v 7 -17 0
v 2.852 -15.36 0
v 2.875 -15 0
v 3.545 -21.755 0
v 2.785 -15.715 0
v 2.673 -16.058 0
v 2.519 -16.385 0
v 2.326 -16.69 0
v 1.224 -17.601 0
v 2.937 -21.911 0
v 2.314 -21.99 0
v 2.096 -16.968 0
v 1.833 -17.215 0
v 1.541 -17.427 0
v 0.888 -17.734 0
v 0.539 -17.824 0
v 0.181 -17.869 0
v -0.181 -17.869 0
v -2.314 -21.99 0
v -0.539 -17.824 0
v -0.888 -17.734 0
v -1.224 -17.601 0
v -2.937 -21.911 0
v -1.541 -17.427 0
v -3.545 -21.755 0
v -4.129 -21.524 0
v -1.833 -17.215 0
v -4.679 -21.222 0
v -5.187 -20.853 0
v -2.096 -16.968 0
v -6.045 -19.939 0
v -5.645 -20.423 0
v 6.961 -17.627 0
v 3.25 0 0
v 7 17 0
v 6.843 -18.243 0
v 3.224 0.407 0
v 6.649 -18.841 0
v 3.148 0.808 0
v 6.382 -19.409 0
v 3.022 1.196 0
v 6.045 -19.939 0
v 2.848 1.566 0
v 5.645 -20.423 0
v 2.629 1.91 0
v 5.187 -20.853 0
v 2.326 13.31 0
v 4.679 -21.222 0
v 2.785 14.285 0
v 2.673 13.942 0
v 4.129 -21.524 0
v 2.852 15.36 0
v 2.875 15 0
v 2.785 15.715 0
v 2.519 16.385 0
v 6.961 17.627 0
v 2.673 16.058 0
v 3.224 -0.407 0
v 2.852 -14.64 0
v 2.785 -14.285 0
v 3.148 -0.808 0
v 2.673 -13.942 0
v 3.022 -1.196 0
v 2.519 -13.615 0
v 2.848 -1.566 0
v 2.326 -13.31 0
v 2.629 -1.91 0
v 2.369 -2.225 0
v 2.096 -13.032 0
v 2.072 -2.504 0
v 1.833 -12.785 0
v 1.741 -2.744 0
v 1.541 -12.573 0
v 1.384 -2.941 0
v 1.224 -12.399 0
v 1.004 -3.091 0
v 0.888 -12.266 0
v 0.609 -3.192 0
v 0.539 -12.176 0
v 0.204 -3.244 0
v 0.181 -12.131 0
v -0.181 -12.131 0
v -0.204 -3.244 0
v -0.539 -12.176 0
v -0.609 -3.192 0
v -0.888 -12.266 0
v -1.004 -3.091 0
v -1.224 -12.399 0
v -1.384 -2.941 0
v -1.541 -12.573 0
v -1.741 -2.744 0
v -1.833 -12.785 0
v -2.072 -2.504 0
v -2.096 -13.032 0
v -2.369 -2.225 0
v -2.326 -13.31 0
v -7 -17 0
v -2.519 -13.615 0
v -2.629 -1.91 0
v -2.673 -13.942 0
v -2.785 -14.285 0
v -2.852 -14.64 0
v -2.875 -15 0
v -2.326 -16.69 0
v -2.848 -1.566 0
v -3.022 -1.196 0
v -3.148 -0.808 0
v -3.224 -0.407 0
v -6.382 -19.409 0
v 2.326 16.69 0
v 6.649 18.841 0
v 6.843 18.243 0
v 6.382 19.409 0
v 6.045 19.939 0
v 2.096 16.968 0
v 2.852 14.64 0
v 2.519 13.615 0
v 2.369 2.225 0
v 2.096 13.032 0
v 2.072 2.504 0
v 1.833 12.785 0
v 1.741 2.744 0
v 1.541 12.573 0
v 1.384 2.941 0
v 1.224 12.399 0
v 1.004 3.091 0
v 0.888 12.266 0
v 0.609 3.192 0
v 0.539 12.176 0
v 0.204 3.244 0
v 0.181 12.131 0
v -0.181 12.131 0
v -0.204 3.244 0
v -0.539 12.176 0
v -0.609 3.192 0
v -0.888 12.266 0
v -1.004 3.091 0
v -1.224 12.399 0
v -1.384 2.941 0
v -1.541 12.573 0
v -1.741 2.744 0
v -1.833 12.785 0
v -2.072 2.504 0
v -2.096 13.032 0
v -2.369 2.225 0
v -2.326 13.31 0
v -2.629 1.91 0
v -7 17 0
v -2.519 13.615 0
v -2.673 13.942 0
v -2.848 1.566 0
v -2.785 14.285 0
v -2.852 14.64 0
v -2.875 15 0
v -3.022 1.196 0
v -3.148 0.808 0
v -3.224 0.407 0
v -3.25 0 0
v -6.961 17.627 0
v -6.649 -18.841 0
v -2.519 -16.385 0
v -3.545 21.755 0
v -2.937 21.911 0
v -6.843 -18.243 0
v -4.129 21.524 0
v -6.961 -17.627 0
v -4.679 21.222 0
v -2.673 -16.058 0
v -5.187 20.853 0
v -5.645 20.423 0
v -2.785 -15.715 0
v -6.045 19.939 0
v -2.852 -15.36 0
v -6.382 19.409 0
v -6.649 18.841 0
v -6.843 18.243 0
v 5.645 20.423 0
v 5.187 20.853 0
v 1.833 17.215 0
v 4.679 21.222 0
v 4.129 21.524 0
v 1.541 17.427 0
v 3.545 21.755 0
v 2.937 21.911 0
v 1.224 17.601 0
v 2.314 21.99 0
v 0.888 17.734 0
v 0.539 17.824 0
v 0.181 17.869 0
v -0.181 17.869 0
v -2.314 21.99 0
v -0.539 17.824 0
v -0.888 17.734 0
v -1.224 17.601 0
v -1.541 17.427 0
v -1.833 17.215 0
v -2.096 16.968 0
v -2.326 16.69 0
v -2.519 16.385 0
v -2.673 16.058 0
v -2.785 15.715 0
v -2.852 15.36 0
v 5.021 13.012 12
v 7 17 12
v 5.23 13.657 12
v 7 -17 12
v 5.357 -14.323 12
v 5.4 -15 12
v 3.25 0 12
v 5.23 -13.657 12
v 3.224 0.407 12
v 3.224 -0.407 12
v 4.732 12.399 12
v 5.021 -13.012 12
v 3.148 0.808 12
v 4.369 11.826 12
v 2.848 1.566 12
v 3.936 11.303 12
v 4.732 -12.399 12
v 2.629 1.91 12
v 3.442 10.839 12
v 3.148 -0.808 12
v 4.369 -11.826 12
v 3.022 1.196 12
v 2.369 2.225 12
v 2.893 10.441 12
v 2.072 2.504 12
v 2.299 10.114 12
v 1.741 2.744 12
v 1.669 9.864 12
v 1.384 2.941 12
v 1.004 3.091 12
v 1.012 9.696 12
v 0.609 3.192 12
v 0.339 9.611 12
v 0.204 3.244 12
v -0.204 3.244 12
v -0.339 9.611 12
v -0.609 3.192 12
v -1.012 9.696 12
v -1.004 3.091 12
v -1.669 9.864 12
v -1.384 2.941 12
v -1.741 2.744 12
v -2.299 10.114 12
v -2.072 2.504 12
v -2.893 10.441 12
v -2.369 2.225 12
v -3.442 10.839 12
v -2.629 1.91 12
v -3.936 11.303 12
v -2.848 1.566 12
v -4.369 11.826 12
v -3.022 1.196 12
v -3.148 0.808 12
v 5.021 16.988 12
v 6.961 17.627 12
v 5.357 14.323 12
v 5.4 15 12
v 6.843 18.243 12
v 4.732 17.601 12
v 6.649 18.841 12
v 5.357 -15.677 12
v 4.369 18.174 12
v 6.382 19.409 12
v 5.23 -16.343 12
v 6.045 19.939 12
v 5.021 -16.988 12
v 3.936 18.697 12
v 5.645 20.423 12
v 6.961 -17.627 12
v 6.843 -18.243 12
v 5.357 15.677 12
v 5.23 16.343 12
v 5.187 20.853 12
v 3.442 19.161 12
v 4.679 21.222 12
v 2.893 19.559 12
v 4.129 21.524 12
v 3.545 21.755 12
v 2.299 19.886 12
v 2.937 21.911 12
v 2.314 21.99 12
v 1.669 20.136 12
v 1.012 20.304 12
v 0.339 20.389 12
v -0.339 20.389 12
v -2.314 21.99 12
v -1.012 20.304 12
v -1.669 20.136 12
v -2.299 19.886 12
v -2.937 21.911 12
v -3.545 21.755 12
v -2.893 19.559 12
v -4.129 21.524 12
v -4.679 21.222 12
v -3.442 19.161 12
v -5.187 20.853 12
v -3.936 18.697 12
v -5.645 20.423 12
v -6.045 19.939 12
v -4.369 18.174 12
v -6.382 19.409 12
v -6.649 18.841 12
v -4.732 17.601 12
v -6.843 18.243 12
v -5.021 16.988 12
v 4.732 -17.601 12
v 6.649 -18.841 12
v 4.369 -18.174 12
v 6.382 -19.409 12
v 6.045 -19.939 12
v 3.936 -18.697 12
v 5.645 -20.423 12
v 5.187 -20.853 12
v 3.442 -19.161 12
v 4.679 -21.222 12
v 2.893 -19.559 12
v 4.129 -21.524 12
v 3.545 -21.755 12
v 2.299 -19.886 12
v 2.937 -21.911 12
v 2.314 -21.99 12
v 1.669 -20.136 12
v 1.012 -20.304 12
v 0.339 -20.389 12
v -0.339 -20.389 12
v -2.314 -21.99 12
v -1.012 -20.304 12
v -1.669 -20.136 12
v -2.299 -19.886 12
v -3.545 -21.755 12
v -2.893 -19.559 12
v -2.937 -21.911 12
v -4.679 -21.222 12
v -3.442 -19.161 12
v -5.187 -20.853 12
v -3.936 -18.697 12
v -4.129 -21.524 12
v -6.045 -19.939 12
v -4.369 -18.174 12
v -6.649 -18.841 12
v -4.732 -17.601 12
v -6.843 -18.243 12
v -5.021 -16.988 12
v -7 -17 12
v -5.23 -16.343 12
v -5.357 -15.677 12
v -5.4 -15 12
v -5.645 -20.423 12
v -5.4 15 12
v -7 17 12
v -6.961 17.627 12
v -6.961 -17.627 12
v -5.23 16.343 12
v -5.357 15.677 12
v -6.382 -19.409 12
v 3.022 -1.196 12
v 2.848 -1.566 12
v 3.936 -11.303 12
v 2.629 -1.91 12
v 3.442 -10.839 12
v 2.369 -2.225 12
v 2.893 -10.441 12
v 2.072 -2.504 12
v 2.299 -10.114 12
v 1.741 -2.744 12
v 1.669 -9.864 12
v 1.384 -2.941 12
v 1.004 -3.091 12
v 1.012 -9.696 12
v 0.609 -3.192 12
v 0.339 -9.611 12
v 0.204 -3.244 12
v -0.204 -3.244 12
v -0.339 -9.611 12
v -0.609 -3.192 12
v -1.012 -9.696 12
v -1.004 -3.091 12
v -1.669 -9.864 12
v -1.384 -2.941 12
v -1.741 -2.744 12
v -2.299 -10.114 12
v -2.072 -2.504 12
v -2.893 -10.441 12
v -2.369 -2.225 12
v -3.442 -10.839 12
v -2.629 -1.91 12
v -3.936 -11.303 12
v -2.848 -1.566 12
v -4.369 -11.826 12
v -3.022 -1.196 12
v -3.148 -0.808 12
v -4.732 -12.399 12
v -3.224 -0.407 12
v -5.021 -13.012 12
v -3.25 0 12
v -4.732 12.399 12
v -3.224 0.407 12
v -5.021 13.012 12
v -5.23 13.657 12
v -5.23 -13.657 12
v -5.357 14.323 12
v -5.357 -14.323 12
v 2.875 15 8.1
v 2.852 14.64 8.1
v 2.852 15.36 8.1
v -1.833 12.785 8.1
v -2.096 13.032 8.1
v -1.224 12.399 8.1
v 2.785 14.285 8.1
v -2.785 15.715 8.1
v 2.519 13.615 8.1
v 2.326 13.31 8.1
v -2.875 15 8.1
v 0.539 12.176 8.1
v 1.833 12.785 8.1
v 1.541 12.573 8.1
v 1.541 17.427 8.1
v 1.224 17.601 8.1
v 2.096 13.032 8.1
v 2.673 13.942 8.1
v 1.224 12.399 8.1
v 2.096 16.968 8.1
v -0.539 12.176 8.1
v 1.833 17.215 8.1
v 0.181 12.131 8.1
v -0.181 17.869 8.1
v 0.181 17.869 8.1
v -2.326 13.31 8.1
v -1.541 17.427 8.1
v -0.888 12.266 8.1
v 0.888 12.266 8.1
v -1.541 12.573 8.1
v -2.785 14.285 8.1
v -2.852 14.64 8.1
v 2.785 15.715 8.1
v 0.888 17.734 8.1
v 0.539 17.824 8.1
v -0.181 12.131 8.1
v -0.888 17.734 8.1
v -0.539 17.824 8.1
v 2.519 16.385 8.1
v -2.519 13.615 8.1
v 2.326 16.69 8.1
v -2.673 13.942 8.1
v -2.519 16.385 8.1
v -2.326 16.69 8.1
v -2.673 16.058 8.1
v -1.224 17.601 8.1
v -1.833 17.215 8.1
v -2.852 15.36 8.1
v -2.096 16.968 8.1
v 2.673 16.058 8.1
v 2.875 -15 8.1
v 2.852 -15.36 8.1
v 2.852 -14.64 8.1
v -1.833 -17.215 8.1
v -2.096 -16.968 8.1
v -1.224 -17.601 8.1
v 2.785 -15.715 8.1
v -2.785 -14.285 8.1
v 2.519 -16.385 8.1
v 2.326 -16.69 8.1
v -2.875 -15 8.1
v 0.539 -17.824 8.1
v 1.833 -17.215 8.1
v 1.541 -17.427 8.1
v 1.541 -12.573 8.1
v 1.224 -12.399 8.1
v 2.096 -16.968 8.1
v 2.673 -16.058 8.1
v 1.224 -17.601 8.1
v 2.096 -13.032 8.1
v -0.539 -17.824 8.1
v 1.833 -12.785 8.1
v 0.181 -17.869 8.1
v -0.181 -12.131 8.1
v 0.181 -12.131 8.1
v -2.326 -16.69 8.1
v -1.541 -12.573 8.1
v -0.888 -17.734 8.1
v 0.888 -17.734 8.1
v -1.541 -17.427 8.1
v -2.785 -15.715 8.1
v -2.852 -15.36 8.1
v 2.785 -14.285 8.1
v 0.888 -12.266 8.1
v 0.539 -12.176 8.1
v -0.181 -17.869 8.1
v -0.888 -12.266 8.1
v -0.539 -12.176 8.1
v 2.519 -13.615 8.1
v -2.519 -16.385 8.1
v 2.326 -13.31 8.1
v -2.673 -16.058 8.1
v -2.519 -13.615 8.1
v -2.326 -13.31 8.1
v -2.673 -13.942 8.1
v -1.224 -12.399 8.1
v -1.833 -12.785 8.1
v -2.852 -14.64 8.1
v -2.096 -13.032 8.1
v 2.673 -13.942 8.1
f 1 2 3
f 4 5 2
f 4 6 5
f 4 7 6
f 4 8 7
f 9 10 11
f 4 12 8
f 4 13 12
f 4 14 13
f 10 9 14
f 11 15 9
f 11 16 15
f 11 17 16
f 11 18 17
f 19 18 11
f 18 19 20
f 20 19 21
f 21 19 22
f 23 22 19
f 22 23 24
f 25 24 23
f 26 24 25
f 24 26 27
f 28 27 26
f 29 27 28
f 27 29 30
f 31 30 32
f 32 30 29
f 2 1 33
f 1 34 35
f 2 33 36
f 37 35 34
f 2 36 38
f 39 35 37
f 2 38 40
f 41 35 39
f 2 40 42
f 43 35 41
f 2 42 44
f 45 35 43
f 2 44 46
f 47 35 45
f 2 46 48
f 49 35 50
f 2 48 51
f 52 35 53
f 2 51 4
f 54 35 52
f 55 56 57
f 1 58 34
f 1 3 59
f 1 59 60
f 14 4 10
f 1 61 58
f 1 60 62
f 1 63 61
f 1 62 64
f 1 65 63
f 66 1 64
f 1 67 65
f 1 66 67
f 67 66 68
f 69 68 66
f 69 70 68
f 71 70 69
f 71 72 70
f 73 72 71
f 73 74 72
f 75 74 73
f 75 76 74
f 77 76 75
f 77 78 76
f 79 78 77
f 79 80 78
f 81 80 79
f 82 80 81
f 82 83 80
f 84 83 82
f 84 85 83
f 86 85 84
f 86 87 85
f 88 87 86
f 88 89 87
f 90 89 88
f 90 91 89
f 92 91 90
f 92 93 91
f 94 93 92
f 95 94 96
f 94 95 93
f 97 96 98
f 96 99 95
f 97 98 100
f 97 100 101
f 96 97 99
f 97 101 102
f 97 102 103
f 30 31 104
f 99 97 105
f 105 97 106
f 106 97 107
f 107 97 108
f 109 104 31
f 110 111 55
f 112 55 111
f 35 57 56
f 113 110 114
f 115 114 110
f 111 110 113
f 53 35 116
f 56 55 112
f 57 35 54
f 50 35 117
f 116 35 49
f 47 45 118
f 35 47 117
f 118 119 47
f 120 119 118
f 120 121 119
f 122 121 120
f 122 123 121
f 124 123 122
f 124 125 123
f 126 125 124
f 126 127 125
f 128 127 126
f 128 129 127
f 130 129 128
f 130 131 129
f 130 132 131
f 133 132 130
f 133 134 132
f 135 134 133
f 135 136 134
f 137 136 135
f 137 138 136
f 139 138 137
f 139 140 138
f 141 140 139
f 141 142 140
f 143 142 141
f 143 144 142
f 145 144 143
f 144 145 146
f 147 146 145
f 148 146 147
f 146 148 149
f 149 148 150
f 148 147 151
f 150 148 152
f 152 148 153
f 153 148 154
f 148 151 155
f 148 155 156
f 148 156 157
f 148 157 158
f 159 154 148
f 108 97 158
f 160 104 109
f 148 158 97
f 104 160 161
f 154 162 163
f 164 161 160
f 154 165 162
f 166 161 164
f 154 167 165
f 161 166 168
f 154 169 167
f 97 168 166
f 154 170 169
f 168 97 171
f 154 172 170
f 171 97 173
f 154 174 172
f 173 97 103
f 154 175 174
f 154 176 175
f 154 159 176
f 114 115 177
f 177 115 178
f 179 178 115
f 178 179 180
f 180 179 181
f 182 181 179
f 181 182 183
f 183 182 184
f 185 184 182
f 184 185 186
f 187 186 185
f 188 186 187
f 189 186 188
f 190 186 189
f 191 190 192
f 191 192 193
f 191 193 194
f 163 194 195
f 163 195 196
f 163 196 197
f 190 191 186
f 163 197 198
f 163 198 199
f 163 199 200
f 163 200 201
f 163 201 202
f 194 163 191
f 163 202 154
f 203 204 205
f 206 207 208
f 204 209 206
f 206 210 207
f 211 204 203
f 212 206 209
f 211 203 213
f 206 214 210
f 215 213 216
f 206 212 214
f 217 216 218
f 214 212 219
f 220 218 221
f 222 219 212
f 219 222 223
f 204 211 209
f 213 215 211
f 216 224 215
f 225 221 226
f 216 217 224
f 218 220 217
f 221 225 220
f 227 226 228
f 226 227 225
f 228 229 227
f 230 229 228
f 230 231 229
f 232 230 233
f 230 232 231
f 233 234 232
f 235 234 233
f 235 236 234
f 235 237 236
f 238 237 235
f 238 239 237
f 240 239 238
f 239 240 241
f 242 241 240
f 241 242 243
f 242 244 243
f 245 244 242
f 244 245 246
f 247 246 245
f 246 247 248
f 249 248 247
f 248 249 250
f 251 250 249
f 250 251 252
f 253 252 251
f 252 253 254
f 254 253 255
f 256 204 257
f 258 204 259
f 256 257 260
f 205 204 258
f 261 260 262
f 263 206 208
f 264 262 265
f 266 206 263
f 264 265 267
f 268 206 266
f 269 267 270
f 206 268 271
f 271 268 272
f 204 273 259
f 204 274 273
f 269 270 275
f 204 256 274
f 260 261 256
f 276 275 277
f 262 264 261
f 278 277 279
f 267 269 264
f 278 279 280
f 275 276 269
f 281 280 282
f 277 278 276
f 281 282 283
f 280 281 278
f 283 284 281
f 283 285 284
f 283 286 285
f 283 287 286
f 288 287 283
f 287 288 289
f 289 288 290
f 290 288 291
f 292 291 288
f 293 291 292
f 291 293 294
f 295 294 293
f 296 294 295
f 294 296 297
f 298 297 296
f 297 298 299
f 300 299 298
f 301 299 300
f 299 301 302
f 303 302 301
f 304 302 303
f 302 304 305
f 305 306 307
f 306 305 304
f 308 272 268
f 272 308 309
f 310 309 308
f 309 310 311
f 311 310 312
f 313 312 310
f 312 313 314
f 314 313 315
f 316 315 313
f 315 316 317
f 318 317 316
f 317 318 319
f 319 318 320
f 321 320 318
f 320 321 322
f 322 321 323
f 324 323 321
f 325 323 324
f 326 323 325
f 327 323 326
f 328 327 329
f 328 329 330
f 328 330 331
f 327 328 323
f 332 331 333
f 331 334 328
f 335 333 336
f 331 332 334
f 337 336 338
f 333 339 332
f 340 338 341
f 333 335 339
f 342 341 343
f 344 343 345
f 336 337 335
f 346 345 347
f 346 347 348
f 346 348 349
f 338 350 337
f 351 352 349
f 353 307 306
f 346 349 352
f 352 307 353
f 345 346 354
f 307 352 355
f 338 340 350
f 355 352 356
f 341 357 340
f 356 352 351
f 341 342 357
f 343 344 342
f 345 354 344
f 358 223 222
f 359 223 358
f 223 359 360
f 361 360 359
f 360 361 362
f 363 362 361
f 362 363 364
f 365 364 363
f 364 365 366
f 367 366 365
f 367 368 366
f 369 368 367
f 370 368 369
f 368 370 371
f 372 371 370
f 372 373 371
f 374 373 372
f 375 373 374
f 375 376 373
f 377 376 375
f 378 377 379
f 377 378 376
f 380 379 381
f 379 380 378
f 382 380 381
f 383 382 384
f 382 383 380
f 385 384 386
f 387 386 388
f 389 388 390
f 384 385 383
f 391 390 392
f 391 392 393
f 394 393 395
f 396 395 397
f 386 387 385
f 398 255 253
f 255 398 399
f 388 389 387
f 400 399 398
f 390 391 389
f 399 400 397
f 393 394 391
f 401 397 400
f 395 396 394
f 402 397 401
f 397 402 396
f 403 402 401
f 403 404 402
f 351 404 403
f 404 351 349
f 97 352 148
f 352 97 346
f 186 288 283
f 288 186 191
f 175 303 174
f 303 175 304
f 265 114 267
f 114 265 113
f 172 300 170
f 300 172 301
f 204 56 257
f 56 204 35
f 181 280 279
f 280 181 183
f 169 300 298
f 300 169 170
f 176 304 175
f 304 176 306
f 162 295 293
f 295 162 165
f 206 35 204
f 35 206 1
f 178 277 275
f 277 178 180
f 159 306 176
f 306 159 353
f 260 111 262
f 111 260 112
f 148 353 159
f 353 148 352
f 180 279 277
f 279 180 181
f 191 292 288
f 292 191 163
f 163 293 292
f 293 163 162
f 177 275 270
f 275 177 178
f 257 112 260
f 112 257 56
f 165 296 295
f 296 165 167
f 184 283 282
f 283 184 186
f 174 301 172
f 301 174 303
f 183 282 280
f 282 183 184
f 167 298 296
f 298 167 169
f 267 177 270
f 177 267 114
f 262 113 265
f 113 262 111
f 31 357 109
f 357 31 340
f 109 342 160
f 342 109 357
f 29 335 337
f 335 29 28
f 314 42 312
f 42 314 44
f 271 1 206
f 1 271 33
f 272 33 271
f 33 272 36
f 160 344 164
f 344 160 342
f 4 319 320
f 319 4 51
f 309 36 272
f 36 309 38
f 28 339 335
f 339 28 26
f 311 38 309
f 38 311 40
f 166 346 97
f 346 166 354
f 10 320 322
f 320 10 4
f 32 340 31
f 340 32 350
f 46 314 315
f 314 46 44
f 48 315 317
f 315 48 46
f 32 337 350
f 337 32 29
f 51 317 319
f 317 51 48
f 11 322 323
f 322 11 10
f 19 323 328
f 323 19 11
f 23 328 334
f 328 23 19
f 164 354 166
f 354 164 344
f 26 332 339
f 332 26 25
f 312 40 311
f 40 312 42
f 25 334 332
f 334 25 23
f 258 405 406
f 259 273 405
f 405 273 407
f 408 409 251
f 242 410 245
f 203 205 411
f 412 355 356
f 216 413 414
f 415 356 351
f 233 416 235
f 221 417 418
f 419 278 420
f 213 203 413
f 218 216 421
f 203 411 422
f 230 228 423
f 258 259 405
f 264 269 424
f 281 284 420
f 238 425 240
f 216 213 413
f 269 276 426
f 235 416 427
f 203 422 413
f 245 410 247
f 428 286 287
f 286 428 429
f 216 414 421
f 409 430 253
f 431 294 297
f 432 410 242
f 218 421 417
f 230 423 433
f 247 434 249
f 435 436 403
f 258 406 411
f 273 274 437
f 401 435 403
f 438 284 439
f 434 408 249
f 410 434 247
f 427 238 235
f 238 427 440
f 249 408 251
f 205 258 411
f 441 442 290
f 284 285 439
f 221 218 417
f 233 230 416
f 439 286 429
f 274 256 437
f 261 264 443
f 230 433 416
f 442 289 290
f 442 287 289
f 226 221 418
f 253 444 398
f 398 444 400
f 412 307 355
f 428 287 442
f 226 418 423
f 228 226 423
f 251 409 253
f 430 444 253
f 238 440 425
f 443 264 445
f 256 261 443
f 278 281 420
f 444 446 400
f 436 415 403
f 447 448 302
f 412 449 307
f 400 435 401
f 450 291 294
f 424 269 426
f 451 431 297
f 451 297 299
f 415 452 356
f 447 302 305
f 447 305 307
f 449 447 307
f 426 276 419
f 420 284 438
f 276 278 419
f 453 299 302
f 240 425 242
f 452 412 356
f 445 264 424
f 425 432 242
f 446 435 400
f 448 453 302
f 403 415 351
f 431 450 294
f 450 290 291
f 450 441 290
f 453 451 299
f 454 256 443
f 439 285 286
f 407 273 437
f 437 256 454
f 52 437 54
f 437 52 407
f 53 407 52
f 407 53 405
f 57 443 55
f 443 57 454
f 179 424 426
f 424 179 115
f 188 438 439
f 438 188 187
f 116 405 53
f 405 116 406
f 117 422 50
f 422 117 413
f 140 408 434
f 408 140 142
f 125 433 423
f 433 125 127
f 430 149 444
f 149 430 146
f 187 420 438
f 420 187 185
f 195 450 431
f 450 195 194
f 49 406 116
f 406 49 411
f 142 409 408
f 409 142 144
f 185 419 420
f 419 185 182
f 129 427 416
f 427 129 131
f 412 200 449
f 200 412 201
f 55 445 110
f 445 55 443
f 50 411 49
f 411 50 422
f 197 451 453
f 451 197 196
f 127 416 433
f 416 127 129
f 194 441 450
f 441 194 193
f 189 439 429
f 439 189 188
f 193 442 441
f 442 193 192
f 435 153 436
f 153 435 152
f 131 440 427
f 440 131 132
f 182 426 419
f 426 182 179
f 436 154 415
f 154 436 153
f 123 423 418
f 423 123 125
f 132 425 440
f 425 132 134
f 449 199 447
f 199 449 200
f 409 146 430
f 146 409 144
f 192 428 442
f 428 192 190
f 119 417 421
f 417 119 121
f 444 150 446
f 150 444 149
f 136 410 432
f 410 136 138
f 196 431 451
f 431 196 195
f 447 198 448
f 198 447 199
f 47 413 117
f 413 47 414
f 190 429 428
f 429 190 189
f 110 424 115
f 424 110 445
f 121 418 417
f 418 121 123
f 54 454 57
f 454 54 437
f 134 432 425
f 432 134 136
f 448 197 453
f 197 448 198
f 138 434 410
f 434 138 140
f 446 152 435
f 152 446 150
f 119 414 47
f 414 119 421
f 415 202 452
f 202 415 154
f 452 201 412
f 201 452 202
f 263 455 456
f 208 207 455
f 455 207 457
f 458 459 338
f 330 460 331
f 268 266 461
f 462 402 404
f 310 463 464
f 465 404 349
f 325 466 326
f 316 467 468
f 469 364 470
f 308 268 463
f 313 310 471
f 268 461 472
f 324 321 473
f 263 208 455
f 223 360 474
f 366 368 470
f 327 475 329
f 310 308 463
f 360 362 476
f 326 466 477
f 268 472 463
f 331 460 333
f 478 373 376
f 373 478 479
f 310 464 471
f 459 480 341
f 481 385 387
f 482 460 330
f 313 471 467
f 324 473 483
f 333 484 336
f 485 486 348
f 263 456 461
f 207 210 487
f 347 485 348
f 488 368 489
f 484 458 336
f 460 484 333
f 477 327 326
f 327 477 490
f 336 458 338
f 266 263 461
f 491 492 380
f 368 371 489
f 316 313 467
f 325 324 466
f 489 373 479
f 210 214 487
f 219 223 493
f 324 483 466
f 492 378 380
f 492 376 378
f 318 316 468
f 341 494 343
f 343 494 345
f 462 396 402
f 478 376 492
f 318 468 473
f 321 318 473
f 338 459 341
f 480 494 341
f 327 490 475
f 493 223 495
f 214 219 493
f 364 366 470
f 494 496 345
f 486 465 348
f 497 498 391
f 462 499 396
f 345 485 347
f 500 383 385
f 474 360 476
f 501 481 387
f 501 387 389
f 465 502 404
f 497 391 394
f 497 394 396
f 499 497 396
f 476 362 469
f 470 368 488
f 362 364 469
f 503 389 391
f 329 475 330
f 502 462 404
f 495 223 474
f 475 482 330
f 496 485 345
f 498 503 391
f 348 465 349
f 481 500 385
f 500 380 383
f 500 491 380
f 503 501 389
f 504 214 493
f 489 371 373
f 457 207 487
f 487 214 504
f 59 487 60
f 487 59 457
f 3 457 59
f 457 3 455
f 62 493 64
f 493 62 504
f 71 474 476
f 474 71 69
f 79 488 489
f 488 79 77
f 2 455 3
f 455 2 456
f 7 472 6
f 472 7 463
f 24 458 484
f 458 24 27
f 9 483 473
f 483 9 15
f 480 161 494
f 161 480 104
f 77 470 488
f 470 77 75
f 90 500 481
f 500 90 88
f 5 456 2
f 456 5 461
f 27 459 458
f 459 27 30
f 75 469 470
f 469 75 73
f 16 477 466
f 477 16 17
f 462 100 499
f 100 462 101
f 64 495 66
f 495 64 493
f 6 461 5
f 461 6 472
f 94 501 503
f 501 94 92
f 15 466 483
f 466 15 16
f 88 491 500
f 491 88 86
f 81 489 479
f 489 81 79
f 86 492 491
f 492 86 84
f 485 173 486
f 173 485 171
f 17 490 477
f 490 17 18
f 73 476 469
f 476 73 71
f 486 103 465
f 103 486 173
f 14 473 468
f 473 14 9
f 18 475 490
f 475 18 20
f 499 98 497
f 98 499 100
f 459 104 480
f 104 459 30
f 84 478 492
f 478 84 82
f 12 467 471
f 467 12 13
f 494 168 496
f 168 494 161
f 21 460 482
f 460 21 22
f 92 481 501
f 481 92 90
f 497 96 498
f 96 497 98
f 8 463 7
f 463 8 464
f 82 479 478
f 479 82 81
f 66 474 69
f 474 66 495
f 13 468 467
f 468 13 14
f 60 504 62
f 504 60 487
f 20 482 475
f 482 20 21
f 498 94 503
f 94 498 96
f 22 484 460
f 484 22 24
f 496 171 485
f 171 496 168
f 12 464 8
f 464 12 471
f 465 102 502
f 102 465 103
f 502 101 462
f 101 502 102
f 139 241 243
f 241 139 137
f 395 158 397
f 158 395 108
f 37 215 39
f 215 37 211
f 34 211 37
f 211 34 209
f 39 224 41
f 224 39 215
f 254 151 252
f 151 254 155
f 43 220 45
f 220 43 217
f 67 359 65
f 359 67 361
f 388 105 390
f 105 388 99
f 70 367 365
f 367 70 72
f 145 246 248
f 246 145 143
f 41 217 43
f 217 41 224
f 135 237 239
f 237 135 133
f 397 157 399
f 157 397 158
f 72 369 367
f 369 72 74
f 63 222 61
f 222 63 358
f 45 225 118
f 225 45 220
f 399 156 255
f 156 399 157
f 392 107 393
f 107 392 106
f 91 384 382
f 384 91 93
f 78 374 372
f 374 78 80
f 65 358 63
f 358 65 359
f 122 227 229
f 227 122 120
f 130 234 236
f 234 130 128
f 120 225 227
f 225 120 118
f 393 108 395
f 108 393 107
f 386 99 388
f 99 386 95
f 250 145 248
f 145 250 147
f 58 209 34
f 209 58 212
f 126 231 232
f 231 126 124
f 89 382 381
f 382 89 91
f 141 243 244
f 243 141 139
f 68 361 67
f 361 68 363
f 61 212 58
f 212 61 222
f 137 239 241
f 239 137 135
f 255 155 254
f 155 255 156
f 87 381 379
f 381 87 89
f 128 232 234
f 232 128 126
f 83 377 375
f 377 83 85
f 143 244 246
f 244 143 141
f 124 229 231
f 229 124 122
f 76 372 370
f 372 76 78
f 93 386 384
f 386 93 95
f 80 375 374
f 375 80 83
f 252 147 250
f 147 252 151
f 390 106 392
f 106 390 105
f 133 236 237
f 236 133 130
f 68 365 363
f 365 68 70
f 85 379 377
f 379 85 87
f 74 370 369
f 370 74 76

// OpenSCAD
$fn = 50;


difference() {
	union() {
		cylinder(h = 12, r = 7.0000000000);
		translate(v = [0.0000000000, 7.5000000000, 0]) {
			hull() {
				translate(v = [-2.0000000000, 9.5000000000, 0]) {
					cylinder(h = 12, r = 5);
				}
				translate(v = [2.0000000000, 9.5000000000, 0]) {
					cylinder(h = 12, r = 5);
				}
				translate(v = [-2.0000000000, -9.5000000000, 0]) {
					cylinder(h = 12, r = 5);
				}
				translate(v = [2.0000000000, -9.5000000000, 0]) {
					cylinder(h = 12, r = 5);
				}
			}
		}
		translate(v = [0.0000000000, 7.5000000000, 0]) {
			hull() {
				translate(v = [-2.0000000000, 9.5000000000, 0]) {
					cylinder(h = 12, r = 5);
				}
				translate(v = [2.0000000000, 9.5000000000, 0]) {
					cylinder(h = 12, r = 5);
				}
				translate(v = [-2.0000000000, -9.5000000000, 0]) {
					cylinder(h = 12, r = 5);
				}
				translate(v = [2.0000000000, -9.5000000000, 0]) {
					cylinder(h = 12, r = 5);
				}
			}
		}
		translate(v = [0.0000000000, -7.5000000000, 0]) {
			hull() {
				translate(v = [-2.0000000000, 9.5000000000, 0]) {
					cylinder(h = 12, r = 5);
				}
				translate(v = [2.0000000000, 9.5000000000, 0]) {
					cylinder(h = 12, r = 5);
				}
				translate(v = [-2.0000000000, -9.5000000000, 0]) {
					cylinder(h = 12, r = 5);
				}
				translate(v = [2.0000000000, -9.5000000000, 0]) {
					cylinder(h = 12, r = 5);
				}
			}
		}
		translate(v = [0.0000000000, -7.5000000000, 0]) {
			hull() {
				translate(v = [-2.0000000000, 9.5000000000, 0]) {
					cylinder(h = 12, r = 5);
				}
				translate(v = [2.0000000000, 9.5000000000, 0]) {
					cylinder(h = 12, r = 5);
				}
				translate(v = [-2.0000000000, -9.5000000000, 0]) {
					cylinder(h = 12, r = 5);
				}
				translate(v = [2.0000000000, -9.5000000000, 0]) {
					cylinder(h = 12, r = 5);
				}
			}
		}
	}
	union() {
		translate(v = [0.0000000000, 15.0000000000, 12]) {
			rotate(a = [0, 0, 0]) {
				difference() {
					union() {
						#translate(v = [0, 0, -12.0000000000]) {
							cylinder(h = 12, r = 2.6000000000);
						}
						#translate(v = [0, 0, -3.9000000000]) {
							cylinder(h = 3.9000000000, r1 = 2.8750000000, r2 = 5.4000000000);
						}
						#translate(v = [0, 0, -12.0000000000]) {
							cylinder(h = 12, r = 2.8750000000);
						}
						#translate(v = [0, 0, -12.0000000000]) {
							cylinder(h = 12, r = 2.6000000000);
						}
					}
					union();
				}
			}
		}
		translate(v = [0.0000000000, 15.0000000000, 12]) {
			rotate(a = [0, 0, 0]) {
				difference() {
					union() {
						#translate(v = [0, 0, -12.0000000000]) {
							cylinder(h = 12, r = 2.6000000000);
						}
						#translate(v = [0, 0, -3.9000000000]) {
							cylinder(h = 3.9000000000, r1 = 2.8750000000, r2 = 5.4000000000);
						}
						#translate(v = [0, 0, -12.0000000000]) {
							cylinder(h = 12, r = 2.8750000000);
						}
						#translate(v = [0, 0, -12.0000000000]) {
							cylinder(h = 12, r = 2.6000000000);
						}
					}
					union();
				}
			}
		}
		translate(v = [0.0000000000, -15.0000000000, 12]) {
			rotate(a = [0, 0, 0]) {
				difference() {
					union() {
						#translate(v = [0, 0, -12.0000000000]) {
							cylinder(h = 12, r = 2.6000000000);
						}
						#translate(v = [0, 0, -3.9000000000]) {
							cylinder(h = 3.9000000000, r1 = 2.8750000000, r2 = 5.4000000000);
						}
						#translate(v = [0, 0, -12.0000000000]) {
							cylinder(h = 12, r = 2.8750000000);
						}
						#translate(v = [0, 0, -12.0000000000]) {
							cylinder(h = 12, r = 2.6000000000);
						}
					}
					union();
				}
			}
		}
		translate(v = [0.0000000000, -15.0000000000, 12]) {
			rotate(a = [0, 0, 0]) {
				difference() {
					union() {
						#translate(v = [0, 0, -12.0000000000]) {
							cylinder(h = 12, r = 2.6000000000);
						}
						#translate(v = [0, 0, -3.9000000000]) {
							cylinder(h = 3.9000000000, r1 = 2.8750000000, r2 = 5.4000000000);
						}
						#translate(v = [0, 0, -12.0000000000]) {
							cylinder(h = 12, r = 2.8750000000);
						}
						#translate(v = [0, 0, -12.0000000000]) {
							cylinder(h = 12, r = 2.6000000000);
						}
					}
					union();
				}
			}
		}
		translate(v = [0, 0, -100]) {
			cylinder(h = 200, r = 3.2500000000);
		}
		translate(v = [0, 0, -100]) {
			cylinder(h = 200, r = 1.8000000000);
		}
	}
}
